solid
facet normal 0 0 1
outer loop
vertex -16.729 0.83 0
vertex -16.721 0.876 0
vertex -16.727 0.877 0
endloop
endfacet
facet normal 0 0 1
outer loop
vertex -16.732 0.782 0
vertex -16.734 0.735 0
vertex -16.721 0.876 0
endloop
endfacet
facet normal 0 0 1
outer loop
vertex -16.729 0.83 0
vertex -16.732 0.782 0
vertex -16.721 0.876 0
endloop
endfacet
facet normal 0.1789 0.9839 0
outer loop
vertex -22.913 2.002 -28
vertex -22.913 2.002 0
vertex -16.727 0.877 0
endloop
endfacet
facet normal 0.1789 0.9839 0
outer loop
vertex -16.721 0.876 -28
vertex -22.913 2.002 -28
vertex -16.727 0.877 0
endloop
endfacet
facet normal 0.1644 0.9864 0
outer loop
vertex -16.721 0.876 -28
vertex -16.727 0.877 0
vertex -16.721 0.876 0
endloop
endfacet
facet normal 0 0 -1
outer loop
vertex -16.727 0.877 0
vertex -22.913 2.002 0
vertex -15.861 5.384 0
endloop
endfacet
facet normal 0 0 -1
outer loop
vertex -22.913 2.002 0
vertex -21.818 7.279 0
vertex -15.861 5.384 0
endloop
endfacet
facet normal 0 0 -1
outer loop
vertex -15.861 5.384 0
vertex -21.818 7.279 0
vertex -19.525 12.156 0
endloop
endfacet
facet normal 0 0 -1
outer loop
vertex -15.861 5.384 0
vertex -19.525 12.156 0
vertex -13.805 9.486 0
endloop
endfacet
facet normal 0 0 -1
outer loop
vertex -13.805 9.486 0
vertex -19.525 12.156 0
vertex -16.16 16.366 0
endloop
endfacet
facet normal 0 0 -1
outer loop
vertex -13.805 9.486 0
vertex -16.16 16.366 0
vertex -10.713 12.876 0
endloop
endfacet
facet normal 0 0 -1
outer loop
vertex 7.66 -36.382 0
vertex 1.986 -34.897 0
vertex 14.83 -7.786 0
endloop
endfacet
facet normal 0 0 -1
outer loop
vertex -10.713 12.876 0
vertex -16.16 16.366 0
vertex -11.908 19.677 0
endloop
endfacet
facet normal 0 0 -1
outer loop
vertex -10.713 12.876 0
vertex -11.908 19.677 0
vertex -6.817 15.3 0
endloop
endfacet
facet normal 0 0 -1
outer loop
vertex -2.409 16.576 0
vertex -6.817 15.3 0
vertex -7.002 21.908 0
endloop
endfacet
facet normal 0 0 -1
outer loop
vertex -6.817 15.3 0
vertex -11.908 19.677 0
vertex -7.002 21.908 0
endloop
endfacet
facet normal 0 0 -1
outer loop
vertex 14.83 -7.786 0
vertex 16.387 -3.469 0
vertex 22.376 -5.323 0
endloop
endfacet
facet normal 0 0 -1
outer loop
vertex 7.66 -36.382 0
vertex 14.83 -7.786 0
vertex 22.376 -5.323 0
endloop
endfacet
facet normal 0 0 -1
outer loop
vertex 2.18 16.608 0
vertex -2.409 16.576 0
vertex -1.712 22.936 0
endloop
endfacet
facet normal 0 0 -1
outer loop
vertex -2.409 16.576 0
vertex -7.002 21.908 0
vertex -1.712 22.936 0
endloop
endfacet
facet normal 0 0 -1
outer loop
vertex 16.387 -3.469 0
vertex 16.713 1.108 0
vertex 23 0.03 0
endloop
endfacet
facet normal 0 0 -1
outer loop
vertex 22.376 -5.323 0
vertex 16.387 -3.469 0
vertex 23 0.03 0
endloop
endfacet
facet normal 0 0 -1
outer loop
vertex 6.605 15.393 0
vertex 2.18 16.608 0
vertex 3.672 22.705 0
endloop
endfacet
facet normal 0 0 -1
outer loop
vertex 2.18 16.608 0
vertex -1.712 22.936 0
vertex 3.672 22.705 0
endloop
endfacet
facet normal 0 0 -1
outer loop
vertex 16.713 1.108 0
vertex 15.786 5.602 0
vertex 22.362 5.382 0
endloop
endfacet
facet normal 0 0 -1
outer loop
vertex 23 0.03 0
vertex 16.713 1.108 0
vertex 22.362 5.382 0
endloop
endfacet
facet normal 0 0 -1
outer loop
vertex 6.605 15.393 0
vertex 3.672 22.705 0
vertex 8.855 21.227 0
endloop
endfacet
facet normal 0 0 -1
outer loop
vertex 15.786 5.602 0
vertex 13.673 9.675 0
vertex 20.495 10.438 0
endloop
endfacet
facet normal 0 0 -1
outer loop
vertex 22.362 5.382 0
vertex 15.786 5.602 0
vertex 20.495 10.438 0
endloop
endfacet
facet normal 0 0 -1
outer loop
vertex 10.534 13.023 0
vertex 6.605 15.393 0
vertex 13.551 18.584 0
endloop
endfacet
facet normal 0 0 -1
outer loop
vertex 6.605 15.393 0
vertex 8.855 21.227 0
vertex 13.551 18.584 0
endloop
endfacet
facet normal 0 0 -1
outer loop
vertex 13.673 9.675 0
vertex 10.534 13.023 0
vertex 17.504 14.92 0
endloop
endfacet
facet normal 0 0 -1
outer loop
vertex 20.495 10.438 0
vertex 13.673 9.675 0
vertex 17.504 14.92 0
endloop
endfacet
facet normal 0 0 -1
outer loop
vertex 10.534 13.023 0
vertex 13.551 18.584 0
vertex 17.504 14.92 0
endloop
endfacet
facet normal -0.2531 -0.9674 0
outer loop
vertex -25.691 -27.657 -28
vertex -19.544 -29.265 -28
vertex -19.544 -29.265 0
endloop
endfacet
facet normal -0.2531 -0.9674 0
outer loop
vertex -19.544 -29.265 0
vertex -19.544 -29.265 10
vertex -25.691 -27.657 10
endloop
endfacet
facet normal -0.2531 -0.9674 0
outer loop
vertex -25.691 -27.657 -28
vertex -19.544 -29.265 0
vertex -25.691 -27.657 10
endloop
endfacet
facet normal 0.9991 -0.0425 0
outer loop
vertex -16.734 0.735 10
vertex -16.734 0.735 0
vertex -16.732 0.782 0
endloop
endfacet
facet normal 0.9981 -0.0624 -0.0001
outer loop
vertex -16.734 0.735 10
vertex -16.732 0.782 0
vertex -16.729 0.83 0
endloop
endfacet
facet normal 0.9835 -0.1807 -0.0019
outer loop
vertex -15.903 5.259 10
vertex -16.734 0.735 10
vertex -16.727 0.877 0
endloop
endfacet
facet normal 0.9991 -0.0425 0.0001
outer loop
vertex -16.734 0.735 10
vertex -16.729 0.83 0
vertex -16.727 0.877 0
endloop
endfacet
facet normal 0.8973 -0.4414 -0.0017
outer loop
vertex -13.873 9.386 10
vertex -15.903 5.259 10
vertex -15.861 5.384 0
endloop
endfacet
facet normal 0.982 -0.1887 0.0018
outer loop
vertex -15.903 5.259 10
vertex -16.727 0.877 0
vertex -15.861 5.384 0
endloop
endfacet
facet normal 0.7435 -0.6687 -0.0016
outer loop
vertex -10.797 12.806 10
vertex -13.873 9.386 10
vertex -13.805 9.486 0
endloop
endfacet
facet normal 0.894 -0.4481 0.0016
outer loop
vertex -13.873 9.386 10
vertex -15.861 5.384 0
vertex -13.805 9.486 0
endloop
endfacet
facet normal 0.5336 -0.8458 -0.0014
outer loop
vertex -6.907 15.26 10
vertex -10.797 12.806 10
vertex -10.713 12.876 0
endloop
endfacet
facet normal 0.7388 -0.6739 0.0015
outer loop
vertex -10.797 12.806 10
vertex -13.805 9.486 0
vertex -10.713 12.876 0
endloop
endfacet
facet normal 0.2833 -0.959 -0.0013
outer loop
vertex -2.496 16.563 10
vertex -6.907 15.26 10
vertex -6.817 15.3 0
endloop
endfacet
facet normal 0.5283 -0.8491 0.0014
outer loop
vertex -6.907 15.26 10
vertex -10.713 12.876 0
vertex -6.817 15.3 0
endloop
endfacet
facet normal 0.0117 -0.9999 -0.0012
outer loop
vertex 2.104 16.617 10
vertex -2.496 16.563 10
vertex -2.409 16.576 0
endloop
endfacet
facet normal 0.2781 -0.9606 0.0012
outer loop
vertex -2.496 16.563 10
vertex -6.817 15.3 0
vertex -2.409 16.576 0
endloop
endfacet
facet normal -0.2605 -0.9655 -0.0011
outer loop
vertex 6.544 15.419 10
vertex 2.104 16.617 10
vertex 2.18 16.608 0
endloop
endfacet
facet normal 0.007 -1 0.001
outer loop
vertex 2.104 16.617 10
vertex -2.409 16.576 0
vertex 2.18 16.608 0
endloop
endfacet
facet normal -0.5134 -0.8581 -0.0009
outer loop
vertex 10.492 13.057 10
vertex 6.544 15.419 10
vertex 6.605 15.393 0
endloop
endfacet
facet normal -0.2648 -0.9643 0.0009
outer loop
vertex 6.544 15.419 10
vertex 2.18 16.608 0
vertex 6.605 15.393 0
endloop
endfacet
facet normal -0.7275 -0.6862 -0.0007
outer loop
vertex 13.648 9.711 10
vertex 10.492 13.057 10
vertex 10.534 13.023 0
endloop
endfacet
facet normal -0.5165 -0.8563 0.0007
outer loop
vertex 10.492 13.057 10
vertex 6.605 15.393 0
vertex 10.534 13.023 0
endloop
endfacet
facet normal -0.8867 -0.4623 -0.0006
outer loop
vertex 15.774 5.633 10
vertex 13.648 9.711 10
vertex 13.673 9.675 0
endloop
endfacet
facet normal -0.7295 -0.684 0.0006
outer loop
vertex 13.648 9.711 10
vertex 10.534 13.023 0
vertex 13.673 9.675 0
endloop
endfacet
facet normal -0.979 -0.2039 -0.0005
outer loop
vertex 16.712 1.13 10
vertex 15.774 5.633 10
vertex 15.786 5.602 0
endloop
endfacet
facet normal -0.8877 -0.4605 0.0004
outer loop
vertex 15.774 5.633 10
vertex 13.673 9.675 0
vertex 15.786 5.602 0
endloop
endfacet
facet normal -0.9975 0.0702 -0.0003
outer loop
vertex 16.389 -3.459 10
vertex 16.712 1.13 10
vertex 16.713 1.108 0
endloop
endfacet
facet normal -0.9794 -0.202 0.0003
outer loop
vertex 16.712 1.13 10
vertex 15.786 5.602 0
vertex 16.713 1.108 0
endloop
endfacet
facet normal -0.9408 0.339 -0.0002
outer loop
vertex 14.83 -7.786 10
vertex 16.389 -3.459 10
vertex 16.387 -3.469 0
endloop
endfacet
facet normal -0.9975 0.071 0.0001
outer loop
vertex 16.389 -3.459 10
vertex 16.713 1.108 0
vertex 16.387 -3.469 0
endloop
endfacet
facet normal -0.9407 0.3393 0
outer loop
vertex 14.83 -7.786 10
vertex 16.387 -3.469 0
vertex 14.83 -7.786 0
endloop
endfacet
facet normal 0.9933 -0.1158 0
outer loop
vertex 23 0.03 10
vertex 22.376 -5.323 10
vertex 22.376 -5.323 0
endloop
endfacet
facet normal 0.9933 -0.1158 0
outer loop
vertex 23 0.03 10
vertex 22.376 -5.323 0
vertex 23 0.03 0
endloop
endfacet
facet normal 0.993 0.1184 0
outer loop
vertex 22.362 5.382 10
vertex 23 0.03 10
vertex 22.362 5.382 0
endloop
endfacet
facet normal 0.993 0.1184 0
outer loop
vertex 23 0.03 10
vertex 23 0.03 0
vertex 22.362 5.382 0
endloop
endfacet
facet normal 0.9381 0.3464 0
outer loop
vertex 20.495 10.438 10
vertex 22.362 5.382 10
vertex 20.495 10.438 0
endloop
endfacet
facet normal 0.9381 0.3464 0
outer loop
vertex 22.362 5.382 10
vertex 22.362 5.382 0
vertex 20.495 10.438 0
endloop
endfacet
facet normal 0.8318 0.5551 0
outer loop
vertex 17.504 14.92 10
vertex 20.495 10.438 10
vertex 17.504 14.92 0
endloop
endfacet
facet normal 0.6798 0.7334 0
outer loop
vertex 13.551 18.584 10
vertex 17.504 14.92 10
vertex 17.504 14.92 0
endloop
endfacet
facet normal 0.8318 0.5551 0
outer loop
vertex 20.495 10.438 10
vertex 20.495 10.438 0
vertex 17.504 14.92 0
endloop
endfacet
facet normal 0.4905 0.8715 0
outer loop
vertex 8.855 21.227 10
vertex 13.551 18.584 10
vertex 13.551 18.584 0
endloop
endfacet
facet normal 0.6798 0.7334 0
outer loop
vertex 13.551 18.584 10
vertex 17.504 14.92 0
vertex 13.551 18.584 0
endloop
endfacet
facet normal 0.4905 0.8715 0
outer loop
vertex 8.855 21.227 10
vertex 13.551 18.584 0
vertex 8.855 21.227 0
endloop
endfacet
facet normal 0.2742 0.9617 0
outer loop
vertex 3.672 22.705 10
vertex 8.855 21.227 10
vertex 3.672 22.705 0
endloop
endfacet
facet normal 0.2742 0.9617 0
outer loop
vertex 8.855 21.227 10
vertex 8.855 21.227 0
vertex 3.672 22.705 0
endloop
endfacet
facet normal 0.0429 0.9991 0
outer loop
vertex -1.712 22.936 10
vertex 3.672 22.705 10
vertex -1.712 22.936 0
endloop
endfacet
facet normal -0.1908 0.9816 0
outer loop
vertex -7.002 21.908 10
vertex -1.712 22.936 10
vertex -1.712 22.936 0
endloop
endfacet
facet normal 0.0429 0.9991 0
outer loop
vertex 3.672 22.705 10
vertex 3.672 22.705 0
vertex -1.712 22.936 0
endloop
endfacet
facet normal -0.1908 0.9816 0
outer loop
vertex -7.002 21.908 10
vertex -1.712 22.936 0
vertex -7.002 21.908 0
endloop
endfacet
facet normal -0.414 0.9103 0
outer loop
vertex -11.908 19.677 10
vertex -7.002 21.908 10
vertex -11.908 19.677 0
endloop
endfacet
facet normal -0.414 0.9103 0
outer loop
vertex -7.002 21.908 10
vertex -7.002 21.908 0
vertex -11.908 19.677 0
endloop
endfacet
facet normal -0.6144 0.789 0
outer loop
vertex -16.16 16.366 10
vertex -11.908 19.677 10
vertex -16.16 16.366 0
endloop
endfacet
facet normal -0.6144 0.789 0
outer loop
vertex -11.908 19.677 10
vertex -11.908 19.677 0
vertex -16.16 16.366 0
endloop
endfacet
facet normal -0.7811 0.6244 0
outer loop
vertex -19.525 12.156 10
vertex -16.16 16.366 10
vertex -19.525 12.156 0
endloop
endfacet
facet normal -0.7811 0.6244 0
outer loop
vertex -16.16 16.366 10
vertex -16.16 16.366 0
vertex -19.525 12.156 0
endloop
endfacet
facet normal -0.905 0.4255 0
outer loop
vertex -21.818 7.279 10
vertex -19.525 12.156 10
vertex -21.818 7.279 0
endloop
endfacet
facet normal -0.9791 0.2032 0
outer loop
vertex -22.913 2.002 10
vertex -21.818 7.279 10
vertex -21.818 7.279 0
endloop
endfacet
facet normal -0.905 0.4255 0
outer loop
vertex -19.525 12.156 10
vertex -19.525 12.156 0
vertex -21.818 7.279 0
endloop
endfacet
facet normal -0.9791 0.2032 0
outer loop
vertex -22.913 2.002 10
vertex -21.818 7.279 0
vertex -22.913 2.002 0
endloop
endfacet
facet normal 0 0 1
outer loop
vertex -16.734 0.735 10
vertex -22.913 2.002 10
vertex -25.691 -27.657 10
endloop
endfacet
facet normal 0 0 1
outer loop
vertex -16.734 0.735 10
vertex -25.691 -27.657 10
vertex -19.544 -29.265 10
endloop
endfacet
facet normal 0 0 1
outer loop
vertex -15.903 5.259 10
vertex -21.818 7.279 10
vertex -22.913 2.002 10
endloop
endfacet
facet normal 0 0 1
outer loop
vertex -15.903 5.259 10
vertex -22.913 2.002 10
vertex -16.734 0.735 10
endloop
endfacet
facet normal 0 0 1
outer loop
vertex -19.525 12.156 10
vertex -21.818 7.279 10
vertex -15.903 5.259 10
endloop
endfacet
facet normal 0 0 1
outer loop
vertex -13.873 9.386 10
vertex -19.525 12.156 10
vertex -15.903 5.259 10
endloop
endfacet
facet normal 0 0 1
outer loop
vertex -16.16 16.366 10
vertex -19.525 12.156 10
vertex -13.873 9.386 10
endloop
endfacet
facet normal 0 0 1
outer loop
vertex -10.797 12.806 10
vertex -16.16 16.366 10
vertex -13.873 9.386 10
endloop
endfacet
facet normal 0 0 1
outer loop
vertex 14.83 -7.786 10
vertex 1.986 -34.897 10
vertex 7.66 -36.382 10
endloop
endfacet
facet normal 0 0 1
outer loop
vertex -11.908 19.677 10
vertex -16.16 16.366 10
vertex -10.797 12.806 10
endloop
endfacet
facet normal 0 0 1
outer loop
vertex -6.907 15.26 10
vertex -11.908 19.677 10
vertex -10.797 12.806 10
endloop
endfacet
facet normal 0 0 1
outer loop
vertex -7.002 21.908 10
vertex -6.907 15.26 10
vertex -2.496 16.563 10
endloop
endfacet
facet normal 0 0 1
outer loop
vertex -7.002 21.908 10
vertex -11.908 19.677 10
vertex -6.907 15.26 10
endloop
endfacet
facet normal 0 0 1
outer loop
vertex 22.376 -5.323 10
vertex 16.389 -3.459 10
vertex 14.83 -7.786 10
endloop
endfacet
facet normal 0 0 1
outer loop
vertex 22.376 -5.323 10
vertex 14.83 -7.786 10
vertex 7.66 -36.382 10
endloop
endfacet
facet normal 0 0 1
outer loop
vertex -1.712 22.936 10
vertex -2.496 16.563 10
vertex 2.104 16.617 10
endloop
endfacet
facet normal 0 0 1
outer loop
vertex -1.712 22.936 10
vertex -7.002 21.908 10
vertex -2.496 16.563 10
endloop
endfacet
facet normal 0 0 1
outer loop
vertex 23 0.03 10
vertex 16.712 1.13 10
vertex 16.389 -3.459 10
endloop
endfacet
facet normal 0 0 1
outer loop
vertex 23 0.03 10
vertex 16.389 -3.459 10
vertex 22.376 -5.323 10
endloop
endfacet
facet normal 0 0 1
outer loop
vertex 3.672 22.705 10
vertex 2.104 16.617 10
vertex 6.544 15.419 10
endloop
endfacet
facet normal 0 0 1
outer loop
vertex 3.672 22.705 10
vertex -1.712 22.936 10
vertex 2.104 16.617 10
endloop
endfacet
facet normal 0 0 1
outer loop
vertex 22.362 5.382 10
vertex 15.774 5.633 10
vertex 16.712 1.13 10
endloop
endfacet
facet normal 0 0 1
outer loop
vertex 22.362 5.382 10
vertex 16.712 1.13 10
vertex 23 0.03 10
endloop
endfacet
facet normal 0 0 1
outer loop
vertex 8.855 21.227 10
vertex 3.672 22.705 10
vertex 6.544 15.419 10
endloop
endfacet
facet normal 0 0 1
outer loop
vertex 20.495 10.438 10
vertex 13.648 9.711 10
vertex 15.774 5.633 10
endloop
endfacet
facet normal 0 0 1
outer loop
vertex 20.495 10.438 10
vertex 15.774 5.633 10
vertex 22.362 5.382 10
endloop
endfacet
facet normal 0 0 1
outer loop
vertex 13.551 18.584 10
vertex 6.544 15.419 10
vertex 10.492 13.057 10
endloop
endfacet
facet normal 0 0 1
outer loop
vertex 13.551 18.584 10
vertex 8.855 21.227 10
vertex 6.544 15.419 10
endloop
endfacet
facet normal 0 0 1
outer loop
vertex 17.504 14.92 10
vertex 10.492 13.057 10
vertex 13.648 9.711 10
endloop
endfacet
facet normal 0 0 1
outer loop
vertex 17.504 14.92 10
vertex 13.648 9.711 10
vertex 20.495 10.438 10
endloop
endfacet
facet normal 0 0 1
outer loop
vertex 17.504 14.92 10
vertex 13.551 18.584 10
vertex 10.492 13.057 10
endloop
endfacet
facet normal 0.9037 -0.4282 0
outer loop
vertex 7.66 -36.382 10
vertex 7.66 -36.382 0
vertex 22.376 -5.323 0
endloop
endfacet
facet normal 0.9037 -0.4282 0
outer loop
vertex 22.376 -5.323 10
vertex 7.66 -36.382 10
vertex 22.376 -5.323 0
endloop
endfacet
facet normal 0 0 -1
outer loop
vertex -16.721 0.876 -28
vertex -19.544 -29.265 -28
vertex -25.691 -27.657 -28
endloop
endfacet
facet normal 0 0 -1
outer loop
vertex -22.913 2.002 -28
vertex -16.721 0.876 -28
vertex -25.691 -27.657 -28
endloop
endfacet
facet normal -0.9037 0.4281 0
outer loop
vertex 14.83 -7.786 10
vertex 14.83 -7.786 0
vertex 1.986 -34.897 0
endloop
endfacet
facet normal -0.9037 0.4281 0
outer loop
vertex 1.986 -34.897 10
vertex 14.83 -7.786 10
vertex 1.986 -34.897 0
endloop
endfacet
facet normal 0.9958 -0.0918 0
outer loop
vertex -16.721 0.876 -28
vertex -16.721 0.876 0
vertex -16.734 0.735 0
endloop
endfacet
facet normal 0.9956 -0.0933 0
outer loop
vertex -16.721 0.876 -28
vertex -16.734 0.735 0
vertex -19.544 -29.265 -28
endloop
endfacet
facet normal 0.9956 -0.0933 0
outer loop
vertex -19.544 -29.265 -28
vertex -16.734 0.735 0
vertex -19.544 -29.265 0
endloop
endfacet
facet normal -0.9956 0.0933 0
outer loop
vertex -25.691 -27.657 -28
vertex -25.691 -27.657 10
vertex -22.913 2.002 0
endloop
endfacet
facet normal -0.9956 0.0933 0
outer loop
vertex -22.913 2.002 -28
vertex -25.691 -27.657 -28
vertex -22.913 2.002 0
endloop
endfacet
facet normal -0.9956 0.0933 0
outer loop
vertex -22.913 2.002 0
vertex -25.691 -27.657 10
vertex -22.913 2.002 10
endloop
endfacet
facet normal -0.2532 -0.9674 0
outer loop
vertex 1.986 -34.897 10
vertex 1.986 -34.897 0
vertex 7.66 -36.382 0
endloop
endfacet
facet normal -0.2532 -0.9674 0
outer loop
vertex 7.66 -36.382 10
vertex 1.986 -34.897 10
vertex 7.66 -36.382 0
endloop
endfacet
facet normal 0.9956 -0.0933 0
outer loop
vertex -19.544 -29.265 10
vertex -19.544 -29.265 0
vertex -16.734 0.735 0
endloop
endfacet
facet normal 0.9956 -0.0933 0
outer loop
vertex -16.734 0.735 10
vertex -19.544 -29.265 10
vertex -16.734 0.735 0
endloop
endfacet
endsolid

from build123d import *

# Parameters (mm, degrees)
BOSS_EXTRUDE3_DEPTH = 10
BOSS_EXTRUDE4_DEPTH = 28


with BuildPart() as part:
    # Sketch1 → Boss-Extrude3 (new body)
    with BuildSketch(Plane.XY):
        with BuildLine():
            ThreePointArc((-16.733879942, 0.734685024), (4.365374373, 16.171147349), (14.830379862, -7.786034495))
            Line((14.830379862, -7.786034495), (1.98558973, -34.897127547))
            Line((1.98558973, -34.897127547), (7.660402975, -36.381590217))
            Line((7.660402975, -36.381590217), (22.375667903, -5.322545058))
            ThreePointArc((22.375667903, -5.322545058), (3.672252171, 22.704945805), (-22.912677541, 2.002300652))
            Line((-22.912677541, 2.002300652), (-25.690659105, -27.657354808))
            Line((-25.690659105, -27.657354808), (-19.543738844, -29.265314976))
            Line((-19.543738844, -29.265314976), (-16.733879942, 0.734685024))
        make_face()
    extrude(amount=BOSS_EXTRUDE3_DEPTH)

    # Sketch2 → Boss-Extrude4 (add)
    with BuildSketch(Plane(origin=(0, 0, 0), x_dir=(-1, 0, 0), z_dir=(0, 0, -1))):
        Polygon((22.912677541, 2.002300652), (16.720636216, 0.876084213), (19.543738844, -29.265314976), (25.690659105, -27.657354808), align=None)
    extrude(amount=BOSS_EXTRUDE4_DEPTH)


solid = part.part
